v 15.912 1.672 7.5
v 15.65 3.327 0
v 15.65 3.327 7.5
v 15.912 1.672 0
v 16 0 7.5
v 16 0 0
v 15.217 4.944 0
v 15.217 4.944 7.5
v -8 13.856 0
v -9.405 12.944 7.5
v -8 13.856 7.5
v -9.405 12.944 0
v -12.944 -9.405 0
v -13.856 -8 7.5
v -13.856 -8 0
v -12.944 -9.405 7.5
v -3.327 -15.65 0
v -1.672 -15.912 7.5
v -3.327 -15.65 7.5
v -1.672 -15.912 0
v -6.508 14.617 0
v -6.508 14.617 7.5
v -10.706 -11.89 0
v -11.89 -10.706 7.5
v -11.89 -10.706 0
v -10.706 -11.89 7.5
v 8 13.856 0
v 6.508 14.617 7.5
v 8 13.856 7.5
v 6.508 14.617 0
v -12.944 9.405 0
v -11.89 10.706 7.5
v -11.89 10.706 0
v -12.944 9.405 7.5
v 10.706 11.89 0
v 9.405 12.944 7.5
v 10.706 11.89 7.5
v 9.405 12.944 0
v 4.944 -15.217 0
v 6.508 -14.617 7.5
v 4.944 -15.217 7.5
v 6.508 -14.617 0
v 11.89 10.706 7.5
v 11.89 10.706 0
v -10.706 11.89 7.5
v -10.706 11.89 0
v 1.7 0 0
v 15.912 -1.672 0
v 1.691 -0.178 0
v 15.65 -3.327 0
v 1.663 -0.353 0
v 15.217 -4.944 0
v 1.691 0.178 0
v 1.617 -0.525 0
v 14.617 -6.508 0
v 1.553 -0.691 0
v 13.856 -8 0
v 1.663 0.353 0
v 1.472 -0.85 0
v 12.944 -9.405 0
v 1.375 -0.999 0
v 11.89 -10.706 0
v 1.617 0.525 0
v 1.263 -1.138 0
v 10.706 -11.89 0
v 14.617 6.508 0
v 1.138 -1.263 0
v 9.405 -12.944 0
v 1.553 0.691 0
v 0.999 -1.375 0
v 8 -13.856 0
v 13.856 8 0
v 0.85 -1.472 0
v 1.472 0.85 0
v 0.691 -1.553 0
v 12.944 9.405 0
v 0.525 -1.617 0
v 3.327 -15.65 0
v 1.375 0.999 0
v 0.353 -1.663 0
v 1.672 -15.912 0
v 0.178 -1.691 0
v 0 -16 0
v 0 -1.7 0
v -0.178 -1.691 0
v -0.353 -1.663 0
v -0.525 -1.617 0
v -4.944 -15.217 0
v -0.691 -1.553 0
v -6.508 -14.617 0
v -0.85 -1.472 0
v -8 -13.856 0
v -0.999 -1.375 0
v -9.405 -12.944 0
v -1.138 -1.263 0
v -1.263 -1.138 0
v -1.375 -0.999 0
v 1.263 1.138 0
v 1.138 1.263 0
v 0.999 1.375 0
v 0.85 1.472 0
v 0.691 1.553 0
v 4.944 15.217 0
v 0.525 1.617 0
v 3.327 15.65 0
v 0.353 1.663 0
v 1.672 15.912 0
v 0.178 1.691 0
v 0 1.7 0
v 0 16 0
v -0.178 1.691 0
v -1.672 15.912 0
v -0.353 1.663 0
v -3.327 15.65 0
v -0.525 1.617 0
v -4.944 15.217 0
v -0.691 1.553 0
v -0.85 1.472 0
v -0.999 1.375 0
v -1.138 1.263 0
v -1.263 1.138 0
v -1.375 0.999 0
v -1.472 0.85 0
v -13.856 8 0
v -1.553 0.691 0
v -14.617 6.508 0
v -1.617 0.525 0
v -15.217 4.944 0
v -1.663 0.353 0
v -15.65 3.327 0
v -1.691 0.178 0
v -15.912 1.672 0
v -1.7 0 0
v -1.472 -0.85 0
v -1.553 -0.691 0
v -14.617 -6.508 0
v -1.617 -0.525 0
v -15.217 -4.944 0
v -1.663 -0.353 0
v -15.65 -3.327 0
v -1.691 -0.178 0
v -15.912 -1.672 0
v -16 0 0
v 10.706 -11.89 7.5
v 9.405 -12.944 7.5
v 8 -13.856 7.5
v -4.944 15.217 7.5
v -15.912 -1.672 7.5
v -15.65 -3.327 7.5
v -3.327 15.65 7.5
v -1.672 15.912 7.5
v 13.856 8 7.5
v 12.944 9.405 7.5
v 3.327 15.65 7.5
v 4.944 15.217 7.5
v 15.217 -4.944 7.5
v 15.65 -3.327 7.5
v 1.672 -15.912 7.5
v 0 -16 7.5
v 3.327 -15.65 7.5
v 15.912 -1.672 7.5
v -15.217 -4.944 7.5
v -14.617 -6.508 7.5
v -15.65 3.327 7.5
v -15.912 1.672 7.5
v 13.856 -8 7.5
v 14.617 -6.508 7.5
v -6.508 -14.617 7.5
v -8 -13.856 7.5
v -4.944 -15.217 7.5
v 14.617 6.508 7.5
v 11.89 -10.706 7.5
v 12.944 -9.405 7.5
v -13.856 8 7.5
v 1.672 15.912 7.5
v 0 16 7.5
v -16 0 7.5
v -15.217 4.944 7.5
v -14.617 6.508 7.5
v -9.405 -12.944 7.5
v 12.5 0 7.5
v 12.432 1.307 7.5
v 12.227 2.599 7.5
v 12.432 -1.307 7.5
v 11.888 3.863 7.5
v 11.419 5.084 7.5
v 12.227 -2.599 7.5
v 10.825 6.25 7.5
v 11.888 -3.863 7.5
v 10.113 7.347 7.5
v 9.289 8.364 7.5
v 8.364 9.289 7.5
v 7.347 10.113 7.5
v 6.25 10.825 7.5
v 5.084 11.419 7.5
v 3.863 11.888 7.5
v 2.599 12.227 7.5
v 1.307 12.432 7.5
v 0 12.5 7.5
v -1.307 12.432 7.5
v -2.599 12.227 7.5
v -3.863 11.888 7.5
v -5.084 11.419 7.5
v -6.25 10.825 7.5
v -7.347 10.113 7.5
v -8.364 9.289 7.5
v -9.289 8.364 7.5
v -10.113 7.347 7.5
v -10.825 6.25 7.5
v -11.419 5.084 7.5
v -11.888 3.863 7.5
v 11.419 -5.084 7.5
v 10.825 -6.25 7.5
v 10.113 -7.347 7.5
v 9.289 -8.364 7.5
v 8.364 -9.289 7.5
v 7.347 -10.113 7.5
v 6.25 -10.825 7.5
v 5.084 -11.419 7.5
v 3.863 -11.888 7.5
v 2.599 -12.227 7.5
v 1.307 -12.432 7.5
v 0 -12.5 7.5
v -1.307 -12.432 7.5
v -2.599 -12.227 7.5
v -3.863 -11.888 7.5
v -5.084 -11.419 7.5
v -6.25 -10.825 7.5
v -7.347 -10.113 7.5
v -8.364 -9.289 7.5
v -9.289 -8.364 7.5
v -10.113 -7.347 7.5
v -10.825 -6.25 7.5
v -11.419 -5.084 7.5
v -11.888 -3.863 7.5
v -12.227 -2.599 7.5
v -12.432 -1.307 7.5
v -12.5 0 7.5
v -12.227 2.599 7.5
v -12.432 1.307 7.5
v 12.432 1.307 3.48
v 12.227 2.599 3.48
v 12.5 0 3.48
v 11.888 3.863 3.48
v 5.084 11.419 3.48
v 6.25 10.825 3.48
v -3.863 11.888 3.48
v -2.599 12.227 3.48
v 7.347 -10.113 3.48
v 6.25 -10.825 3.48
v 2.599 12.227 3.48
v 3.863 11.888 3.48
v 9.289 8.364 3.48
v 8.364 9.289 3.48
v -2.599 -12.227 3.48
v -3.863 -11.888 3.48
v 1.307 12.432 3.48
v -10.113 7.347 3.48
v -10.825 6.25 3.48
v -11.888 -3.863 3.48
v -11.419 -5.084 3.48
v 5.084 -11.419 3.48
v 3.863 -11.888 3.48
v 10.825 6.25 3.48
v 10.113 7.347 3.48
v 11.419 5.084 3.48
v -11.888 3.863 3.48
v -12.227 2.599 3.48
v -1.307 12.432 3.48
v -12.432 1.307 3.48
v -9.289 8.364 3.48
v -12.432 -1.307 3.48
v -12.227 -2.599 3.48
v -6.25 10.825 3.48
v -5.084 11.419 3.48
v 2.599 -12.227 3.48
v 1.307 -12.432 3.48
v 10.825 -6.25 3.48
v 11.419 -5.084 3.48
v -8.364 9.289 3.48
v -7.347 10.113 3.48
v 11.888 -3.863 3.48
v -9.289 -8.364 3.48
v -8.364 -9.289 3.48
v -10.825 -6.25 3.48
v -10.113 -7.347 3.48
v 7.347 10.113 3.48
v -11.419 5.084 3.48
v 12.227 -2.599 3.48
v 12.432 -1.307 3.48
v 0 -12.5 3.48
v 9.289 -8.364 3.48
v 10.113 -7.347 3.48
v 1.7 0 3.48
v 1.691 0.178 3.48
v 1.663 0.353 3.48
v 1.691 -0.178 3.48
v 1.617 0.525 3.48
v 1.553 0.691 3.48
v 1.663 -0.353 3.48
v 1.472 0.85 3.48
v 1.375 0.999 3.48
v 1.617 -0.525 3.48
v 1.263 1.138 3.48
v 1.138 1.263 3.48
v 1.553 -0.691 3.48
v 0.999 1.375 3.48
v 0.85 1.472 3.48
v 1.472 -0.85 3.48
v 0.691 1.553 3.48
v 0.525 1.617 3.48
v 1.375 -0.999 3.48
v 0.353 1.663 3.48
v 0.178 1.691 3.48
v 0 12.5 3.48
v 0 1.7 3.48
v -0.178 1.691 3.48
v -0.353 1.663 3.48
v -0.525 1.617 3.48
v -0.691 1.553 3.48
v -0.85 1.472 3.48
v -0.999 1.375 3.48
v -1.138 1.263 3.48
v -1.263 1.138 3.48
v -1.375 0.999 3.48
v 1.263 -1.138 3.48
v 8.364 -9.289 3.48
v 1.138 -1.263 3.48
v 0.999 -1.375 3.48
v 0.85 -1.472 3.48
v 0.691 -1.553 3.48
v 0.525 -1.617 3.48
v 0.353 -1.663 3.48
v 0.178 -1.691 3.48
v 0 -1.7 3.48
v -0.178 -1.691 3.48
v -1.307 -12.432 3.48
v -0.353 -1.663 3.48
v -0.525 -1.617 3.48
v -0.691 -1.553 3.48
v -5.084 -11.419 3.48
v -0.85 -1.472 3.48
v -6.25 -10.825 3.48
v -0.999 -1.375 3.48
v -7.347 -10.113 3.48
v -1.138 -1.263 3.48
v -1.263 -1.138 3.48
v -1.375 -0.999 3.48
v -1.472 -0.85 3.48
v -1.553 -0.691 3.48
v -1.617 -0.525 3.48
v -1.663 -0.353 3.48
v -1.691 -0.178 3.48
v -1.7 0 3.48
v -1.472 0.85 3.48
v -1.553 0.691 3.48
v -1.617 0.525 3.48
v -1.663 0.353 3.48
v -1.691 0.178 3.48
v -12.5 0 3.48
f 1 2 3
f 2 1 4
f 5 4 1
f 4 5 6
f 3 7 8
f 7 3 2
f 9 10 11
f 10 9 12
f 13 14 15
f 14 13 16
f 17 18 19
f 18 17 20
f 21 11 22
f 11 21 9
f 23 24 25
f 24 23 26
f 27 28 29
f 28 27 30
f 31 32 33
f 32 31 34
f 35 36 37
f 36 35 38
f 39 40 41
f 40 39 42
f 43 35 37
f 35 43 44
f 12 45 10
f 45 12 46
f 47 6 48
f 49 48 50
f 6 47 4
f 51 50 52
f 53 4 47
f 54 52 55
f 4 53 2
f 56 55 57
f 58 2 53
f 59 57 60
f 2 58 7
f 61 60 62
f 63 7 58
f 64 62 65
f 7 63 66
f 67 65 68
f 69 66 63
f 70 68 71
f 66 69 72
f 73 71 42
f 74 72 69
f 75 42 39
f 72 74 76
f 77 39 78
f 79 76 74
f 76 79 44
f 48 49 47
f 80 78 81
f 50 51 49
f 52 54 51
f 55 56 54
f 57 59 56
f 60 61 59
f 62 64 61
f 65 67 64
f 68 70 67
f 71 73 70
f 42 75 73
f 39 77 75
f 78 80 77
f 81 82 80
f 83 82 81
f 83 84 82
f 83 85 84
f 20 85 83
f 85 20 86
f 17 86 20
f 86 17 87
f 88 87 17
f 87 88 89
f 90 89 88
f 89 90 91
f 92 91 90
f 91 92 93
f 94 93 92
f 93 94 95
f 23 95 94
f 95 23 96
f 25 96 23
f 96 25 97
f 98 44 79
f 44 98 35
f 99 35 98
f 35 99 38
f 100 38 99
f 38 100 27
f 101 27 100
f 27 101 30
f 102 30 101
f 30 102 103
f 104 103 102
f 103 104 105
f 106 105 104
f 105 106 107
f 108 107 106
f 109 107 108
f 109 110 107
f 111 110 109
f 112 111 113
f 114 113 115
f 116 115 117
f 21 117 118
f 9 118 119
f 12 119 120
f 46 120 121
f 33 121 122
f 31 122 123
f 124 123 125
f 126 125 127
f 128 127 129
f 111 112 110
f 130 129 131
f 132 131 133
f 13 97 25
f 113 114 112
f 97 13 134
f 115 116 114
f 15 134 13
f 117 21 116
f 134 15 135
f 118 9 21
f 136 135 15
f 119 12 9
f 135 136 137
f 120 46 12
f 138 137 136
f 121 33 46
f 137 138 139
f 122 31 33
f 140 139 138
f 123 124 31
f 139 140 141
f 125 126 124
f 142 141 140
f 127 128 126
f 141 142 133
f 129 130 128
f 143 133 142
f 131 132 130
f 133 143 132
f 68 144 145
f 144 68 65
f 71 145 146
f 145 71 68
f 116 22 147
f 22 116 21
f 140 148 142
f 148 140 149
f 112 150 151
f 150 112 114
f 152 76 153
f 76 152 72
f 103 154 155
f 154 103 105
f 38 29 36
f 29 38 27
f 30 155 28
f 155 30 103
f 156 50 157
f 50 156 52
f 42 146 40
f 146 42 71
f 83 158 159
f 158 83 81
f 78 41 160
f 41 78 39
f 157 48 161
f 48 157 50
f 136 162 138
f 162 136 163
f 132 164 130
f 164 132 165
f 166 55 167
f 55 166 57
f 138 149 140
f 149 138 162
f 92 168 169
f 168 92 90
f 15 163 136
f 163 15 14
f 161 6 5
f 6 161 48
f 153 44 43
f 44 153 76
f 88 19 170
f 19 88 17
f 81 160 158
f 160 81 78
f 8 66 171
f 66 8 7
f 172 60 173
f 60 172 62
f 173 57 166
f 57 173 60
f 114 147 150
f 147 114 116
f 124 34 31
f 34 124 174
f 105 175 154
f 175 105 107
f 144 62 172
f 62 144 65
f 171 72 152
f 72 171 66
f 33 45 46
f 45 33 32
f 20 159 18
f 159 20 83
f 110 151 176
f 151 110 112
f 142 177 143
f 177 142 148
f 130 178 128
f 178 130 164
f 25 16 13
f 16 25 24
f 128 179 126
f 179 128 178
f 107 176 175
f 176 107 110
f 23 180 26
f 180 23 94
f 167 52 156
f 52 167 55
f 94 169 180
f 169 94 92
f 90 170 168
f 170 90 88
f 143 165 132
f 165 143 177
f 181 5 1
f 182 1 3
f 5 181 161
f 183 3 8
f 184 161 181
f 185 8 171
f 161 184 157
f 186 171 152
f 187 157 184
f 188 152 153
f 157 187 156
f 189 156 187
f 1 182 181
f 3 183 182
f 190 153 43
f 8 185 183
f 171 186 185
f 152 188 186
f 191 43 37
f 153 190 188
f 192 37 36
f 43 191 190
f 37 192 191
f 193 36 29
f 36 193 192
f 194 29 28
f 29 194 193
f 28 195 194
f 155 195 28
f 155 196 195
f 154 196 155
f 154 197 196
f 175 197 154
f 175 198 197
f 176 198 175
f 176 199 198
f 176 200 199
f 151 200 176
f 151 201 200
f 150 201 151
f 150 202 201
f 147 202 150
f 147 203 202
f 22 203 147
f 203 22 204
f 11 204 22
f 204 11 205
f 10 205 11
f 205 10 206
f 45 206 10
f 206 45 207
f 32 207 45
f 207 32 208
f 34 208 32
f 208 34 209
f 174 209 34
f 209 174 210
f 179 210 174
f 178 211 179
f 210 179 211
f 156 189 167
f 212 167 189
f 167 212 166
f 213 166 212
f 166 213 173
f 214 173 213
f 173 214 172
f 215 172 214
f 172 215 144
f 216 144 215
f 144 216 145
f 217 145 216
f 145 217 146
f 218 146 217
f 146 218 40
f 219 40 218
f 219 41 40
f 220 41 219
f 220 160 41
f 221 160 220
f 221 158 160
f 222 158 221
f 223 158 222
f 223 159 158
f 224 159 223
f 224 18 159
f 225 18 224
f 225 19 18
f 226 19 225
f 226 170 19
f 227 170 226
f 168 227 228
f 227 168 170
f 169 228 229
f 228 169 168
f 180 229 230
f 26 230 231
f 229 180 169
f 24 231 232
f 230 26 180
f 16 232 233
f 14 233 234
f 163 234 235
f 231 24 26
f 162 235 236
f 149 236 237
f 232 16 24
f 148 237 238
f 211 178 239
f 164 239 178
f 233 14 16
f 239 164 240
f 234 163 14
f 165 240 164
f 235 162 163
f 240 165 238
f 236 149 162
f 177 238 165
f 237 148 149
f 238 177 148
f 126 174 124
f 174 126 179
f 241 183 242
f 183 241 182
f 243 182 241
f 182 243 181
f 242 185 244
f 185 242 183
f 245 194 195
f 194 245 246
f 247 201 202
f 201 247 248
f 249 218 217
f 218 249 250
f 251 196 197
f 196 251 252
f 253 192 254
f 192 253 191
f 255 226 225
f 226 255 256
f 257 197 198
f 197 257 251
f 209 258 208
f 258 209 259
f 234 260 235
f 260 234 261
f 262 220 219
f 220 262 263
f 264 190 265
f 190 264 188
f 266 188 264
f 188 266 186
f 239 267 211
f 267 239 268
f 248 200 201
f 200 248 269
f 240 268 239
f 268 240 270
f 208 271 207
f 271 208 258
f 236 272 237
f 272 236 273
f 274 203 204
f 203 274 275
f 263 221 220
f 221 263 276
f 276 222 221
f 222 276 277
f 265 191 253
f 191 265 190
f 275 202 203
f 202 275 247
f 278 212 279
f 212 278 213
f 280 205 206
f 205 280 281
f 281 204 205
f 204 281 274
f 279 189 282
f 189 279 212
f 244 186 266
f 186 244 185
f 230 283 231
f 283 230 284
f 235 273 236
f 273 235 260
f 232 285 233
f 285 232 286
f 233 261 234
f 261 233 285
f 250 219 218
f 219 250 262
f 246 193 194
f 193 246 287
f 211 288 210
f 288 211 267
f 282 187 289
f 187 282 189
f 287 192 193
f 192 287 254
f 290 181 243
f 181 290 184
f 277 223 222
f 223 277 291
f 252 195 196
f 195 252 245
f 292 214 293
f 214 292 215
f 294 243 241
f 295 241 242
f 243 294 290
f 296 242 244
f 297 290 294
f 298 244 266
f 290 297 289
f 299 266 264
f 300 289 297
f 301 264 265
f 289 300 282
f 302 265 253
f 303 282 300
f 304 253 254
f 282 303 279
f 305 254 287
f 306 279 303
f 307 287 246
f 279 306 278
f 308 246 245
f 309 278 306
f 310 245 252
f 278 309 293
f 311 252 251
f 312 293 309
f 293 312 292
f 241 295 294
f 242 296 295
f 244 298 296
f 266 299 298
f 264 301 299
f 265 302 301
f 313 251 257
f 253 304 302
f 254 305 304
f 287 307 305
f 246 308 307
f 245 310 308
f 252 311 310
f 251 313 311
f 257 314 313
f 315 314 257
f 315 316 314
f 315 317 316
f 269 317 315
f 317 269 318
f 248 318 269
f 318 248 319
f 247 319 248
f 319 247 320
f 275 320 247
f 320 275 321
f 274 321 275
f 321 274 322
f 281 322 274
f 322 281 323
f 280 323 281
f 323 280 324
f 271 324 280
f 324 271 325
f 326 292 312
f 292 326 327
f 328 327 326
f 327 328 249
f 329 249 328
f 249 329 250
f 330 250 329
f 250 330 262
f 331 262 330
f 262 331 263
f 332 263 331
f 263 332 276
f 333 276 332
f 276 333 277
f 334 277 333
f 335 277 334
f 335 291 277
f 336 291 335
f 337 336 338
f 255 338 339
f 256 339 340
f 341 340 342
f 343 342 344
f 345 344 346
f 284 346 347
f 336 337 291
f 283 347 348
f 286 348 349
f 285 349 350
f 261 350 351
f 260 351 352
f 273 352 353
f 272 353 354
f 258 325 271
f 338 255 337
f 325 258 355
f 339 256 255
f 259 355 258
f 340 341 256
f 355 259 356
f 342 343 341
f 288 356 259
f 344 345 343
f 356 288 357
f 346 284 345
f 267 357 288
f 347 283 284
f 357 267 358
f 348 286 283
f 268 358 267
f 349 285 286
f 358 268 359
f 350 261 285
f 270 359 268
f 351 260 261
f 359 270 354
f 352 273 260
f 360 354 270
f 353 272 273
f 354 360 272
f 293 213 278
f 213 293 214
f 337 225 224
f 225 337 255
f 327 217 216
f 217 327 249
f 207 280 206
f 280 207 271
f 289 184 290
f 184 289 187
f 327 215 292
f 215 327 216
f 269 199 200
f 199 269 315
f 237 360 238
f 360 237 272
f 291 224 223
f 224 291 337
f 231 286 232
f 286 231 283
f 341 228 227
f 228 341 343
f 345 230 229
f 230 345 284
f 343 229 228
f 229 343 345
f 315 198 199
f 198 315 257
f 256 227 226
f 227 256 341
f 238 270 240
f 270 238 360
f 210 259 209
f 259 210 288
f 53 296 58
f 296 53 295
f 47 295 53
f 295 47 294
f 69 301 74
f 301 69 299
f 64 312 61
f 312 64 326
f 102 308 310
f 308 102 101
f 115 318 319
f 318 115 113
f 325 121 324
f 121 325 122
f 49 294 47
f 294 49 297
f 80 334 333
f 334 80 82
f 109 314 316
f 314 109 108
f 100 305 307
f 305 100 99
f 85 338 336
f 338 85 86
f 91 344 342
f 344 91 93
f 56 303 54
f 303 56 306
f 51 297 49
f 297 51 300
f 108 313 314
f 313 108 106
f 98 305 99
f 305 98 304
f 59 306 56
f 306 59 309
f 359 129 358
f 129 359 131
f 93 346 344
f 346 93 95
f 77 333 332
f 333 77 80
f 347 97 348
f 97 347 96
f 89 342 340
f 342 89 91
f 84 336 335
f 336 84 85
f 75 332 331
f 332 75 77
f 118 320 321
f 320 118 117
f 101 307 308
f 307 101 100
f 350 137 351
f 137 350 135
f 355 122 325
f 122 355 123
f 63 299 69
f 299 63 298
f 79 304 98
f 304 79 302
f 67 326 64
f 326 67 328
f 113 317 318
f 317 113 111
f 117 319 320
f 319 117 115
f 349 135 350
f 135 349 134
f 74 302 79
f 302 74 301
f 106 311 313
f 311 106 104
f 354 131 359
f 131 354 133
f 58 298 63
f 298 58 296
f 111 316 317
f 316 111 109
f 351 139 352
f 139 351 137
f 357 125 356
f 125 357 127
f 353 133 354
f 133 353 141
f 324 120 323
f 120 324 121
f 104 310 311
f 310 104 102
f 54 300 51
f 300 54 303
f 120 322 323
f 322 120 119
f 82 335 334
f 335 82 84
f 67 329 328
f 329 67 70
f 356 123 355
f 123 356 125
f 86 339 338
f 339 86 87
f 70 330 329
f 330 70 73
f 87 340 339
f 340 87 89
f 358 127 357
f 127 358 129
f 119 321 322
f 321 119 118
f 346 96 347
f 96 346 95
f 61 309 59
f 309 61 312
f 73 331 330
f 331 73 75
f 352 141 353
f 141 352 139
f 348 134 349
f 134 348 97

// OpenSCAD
// Recessed magnet cup.
$fn = 60;
eps = 0.02;
magnet_d = 25;
wall = 3.5;
outer_d = magnet_d+2*wall;
height = wall+4;
difference() {
    cylinder(d=outer_d,h=height);
    translate([0,0,wall-eps]) cylinder(d=magnet_d,h=height-wall+2*eps);
    translate([0,0,-eps]) cylinder(d=3.4,h=wall+2*eps);
}
